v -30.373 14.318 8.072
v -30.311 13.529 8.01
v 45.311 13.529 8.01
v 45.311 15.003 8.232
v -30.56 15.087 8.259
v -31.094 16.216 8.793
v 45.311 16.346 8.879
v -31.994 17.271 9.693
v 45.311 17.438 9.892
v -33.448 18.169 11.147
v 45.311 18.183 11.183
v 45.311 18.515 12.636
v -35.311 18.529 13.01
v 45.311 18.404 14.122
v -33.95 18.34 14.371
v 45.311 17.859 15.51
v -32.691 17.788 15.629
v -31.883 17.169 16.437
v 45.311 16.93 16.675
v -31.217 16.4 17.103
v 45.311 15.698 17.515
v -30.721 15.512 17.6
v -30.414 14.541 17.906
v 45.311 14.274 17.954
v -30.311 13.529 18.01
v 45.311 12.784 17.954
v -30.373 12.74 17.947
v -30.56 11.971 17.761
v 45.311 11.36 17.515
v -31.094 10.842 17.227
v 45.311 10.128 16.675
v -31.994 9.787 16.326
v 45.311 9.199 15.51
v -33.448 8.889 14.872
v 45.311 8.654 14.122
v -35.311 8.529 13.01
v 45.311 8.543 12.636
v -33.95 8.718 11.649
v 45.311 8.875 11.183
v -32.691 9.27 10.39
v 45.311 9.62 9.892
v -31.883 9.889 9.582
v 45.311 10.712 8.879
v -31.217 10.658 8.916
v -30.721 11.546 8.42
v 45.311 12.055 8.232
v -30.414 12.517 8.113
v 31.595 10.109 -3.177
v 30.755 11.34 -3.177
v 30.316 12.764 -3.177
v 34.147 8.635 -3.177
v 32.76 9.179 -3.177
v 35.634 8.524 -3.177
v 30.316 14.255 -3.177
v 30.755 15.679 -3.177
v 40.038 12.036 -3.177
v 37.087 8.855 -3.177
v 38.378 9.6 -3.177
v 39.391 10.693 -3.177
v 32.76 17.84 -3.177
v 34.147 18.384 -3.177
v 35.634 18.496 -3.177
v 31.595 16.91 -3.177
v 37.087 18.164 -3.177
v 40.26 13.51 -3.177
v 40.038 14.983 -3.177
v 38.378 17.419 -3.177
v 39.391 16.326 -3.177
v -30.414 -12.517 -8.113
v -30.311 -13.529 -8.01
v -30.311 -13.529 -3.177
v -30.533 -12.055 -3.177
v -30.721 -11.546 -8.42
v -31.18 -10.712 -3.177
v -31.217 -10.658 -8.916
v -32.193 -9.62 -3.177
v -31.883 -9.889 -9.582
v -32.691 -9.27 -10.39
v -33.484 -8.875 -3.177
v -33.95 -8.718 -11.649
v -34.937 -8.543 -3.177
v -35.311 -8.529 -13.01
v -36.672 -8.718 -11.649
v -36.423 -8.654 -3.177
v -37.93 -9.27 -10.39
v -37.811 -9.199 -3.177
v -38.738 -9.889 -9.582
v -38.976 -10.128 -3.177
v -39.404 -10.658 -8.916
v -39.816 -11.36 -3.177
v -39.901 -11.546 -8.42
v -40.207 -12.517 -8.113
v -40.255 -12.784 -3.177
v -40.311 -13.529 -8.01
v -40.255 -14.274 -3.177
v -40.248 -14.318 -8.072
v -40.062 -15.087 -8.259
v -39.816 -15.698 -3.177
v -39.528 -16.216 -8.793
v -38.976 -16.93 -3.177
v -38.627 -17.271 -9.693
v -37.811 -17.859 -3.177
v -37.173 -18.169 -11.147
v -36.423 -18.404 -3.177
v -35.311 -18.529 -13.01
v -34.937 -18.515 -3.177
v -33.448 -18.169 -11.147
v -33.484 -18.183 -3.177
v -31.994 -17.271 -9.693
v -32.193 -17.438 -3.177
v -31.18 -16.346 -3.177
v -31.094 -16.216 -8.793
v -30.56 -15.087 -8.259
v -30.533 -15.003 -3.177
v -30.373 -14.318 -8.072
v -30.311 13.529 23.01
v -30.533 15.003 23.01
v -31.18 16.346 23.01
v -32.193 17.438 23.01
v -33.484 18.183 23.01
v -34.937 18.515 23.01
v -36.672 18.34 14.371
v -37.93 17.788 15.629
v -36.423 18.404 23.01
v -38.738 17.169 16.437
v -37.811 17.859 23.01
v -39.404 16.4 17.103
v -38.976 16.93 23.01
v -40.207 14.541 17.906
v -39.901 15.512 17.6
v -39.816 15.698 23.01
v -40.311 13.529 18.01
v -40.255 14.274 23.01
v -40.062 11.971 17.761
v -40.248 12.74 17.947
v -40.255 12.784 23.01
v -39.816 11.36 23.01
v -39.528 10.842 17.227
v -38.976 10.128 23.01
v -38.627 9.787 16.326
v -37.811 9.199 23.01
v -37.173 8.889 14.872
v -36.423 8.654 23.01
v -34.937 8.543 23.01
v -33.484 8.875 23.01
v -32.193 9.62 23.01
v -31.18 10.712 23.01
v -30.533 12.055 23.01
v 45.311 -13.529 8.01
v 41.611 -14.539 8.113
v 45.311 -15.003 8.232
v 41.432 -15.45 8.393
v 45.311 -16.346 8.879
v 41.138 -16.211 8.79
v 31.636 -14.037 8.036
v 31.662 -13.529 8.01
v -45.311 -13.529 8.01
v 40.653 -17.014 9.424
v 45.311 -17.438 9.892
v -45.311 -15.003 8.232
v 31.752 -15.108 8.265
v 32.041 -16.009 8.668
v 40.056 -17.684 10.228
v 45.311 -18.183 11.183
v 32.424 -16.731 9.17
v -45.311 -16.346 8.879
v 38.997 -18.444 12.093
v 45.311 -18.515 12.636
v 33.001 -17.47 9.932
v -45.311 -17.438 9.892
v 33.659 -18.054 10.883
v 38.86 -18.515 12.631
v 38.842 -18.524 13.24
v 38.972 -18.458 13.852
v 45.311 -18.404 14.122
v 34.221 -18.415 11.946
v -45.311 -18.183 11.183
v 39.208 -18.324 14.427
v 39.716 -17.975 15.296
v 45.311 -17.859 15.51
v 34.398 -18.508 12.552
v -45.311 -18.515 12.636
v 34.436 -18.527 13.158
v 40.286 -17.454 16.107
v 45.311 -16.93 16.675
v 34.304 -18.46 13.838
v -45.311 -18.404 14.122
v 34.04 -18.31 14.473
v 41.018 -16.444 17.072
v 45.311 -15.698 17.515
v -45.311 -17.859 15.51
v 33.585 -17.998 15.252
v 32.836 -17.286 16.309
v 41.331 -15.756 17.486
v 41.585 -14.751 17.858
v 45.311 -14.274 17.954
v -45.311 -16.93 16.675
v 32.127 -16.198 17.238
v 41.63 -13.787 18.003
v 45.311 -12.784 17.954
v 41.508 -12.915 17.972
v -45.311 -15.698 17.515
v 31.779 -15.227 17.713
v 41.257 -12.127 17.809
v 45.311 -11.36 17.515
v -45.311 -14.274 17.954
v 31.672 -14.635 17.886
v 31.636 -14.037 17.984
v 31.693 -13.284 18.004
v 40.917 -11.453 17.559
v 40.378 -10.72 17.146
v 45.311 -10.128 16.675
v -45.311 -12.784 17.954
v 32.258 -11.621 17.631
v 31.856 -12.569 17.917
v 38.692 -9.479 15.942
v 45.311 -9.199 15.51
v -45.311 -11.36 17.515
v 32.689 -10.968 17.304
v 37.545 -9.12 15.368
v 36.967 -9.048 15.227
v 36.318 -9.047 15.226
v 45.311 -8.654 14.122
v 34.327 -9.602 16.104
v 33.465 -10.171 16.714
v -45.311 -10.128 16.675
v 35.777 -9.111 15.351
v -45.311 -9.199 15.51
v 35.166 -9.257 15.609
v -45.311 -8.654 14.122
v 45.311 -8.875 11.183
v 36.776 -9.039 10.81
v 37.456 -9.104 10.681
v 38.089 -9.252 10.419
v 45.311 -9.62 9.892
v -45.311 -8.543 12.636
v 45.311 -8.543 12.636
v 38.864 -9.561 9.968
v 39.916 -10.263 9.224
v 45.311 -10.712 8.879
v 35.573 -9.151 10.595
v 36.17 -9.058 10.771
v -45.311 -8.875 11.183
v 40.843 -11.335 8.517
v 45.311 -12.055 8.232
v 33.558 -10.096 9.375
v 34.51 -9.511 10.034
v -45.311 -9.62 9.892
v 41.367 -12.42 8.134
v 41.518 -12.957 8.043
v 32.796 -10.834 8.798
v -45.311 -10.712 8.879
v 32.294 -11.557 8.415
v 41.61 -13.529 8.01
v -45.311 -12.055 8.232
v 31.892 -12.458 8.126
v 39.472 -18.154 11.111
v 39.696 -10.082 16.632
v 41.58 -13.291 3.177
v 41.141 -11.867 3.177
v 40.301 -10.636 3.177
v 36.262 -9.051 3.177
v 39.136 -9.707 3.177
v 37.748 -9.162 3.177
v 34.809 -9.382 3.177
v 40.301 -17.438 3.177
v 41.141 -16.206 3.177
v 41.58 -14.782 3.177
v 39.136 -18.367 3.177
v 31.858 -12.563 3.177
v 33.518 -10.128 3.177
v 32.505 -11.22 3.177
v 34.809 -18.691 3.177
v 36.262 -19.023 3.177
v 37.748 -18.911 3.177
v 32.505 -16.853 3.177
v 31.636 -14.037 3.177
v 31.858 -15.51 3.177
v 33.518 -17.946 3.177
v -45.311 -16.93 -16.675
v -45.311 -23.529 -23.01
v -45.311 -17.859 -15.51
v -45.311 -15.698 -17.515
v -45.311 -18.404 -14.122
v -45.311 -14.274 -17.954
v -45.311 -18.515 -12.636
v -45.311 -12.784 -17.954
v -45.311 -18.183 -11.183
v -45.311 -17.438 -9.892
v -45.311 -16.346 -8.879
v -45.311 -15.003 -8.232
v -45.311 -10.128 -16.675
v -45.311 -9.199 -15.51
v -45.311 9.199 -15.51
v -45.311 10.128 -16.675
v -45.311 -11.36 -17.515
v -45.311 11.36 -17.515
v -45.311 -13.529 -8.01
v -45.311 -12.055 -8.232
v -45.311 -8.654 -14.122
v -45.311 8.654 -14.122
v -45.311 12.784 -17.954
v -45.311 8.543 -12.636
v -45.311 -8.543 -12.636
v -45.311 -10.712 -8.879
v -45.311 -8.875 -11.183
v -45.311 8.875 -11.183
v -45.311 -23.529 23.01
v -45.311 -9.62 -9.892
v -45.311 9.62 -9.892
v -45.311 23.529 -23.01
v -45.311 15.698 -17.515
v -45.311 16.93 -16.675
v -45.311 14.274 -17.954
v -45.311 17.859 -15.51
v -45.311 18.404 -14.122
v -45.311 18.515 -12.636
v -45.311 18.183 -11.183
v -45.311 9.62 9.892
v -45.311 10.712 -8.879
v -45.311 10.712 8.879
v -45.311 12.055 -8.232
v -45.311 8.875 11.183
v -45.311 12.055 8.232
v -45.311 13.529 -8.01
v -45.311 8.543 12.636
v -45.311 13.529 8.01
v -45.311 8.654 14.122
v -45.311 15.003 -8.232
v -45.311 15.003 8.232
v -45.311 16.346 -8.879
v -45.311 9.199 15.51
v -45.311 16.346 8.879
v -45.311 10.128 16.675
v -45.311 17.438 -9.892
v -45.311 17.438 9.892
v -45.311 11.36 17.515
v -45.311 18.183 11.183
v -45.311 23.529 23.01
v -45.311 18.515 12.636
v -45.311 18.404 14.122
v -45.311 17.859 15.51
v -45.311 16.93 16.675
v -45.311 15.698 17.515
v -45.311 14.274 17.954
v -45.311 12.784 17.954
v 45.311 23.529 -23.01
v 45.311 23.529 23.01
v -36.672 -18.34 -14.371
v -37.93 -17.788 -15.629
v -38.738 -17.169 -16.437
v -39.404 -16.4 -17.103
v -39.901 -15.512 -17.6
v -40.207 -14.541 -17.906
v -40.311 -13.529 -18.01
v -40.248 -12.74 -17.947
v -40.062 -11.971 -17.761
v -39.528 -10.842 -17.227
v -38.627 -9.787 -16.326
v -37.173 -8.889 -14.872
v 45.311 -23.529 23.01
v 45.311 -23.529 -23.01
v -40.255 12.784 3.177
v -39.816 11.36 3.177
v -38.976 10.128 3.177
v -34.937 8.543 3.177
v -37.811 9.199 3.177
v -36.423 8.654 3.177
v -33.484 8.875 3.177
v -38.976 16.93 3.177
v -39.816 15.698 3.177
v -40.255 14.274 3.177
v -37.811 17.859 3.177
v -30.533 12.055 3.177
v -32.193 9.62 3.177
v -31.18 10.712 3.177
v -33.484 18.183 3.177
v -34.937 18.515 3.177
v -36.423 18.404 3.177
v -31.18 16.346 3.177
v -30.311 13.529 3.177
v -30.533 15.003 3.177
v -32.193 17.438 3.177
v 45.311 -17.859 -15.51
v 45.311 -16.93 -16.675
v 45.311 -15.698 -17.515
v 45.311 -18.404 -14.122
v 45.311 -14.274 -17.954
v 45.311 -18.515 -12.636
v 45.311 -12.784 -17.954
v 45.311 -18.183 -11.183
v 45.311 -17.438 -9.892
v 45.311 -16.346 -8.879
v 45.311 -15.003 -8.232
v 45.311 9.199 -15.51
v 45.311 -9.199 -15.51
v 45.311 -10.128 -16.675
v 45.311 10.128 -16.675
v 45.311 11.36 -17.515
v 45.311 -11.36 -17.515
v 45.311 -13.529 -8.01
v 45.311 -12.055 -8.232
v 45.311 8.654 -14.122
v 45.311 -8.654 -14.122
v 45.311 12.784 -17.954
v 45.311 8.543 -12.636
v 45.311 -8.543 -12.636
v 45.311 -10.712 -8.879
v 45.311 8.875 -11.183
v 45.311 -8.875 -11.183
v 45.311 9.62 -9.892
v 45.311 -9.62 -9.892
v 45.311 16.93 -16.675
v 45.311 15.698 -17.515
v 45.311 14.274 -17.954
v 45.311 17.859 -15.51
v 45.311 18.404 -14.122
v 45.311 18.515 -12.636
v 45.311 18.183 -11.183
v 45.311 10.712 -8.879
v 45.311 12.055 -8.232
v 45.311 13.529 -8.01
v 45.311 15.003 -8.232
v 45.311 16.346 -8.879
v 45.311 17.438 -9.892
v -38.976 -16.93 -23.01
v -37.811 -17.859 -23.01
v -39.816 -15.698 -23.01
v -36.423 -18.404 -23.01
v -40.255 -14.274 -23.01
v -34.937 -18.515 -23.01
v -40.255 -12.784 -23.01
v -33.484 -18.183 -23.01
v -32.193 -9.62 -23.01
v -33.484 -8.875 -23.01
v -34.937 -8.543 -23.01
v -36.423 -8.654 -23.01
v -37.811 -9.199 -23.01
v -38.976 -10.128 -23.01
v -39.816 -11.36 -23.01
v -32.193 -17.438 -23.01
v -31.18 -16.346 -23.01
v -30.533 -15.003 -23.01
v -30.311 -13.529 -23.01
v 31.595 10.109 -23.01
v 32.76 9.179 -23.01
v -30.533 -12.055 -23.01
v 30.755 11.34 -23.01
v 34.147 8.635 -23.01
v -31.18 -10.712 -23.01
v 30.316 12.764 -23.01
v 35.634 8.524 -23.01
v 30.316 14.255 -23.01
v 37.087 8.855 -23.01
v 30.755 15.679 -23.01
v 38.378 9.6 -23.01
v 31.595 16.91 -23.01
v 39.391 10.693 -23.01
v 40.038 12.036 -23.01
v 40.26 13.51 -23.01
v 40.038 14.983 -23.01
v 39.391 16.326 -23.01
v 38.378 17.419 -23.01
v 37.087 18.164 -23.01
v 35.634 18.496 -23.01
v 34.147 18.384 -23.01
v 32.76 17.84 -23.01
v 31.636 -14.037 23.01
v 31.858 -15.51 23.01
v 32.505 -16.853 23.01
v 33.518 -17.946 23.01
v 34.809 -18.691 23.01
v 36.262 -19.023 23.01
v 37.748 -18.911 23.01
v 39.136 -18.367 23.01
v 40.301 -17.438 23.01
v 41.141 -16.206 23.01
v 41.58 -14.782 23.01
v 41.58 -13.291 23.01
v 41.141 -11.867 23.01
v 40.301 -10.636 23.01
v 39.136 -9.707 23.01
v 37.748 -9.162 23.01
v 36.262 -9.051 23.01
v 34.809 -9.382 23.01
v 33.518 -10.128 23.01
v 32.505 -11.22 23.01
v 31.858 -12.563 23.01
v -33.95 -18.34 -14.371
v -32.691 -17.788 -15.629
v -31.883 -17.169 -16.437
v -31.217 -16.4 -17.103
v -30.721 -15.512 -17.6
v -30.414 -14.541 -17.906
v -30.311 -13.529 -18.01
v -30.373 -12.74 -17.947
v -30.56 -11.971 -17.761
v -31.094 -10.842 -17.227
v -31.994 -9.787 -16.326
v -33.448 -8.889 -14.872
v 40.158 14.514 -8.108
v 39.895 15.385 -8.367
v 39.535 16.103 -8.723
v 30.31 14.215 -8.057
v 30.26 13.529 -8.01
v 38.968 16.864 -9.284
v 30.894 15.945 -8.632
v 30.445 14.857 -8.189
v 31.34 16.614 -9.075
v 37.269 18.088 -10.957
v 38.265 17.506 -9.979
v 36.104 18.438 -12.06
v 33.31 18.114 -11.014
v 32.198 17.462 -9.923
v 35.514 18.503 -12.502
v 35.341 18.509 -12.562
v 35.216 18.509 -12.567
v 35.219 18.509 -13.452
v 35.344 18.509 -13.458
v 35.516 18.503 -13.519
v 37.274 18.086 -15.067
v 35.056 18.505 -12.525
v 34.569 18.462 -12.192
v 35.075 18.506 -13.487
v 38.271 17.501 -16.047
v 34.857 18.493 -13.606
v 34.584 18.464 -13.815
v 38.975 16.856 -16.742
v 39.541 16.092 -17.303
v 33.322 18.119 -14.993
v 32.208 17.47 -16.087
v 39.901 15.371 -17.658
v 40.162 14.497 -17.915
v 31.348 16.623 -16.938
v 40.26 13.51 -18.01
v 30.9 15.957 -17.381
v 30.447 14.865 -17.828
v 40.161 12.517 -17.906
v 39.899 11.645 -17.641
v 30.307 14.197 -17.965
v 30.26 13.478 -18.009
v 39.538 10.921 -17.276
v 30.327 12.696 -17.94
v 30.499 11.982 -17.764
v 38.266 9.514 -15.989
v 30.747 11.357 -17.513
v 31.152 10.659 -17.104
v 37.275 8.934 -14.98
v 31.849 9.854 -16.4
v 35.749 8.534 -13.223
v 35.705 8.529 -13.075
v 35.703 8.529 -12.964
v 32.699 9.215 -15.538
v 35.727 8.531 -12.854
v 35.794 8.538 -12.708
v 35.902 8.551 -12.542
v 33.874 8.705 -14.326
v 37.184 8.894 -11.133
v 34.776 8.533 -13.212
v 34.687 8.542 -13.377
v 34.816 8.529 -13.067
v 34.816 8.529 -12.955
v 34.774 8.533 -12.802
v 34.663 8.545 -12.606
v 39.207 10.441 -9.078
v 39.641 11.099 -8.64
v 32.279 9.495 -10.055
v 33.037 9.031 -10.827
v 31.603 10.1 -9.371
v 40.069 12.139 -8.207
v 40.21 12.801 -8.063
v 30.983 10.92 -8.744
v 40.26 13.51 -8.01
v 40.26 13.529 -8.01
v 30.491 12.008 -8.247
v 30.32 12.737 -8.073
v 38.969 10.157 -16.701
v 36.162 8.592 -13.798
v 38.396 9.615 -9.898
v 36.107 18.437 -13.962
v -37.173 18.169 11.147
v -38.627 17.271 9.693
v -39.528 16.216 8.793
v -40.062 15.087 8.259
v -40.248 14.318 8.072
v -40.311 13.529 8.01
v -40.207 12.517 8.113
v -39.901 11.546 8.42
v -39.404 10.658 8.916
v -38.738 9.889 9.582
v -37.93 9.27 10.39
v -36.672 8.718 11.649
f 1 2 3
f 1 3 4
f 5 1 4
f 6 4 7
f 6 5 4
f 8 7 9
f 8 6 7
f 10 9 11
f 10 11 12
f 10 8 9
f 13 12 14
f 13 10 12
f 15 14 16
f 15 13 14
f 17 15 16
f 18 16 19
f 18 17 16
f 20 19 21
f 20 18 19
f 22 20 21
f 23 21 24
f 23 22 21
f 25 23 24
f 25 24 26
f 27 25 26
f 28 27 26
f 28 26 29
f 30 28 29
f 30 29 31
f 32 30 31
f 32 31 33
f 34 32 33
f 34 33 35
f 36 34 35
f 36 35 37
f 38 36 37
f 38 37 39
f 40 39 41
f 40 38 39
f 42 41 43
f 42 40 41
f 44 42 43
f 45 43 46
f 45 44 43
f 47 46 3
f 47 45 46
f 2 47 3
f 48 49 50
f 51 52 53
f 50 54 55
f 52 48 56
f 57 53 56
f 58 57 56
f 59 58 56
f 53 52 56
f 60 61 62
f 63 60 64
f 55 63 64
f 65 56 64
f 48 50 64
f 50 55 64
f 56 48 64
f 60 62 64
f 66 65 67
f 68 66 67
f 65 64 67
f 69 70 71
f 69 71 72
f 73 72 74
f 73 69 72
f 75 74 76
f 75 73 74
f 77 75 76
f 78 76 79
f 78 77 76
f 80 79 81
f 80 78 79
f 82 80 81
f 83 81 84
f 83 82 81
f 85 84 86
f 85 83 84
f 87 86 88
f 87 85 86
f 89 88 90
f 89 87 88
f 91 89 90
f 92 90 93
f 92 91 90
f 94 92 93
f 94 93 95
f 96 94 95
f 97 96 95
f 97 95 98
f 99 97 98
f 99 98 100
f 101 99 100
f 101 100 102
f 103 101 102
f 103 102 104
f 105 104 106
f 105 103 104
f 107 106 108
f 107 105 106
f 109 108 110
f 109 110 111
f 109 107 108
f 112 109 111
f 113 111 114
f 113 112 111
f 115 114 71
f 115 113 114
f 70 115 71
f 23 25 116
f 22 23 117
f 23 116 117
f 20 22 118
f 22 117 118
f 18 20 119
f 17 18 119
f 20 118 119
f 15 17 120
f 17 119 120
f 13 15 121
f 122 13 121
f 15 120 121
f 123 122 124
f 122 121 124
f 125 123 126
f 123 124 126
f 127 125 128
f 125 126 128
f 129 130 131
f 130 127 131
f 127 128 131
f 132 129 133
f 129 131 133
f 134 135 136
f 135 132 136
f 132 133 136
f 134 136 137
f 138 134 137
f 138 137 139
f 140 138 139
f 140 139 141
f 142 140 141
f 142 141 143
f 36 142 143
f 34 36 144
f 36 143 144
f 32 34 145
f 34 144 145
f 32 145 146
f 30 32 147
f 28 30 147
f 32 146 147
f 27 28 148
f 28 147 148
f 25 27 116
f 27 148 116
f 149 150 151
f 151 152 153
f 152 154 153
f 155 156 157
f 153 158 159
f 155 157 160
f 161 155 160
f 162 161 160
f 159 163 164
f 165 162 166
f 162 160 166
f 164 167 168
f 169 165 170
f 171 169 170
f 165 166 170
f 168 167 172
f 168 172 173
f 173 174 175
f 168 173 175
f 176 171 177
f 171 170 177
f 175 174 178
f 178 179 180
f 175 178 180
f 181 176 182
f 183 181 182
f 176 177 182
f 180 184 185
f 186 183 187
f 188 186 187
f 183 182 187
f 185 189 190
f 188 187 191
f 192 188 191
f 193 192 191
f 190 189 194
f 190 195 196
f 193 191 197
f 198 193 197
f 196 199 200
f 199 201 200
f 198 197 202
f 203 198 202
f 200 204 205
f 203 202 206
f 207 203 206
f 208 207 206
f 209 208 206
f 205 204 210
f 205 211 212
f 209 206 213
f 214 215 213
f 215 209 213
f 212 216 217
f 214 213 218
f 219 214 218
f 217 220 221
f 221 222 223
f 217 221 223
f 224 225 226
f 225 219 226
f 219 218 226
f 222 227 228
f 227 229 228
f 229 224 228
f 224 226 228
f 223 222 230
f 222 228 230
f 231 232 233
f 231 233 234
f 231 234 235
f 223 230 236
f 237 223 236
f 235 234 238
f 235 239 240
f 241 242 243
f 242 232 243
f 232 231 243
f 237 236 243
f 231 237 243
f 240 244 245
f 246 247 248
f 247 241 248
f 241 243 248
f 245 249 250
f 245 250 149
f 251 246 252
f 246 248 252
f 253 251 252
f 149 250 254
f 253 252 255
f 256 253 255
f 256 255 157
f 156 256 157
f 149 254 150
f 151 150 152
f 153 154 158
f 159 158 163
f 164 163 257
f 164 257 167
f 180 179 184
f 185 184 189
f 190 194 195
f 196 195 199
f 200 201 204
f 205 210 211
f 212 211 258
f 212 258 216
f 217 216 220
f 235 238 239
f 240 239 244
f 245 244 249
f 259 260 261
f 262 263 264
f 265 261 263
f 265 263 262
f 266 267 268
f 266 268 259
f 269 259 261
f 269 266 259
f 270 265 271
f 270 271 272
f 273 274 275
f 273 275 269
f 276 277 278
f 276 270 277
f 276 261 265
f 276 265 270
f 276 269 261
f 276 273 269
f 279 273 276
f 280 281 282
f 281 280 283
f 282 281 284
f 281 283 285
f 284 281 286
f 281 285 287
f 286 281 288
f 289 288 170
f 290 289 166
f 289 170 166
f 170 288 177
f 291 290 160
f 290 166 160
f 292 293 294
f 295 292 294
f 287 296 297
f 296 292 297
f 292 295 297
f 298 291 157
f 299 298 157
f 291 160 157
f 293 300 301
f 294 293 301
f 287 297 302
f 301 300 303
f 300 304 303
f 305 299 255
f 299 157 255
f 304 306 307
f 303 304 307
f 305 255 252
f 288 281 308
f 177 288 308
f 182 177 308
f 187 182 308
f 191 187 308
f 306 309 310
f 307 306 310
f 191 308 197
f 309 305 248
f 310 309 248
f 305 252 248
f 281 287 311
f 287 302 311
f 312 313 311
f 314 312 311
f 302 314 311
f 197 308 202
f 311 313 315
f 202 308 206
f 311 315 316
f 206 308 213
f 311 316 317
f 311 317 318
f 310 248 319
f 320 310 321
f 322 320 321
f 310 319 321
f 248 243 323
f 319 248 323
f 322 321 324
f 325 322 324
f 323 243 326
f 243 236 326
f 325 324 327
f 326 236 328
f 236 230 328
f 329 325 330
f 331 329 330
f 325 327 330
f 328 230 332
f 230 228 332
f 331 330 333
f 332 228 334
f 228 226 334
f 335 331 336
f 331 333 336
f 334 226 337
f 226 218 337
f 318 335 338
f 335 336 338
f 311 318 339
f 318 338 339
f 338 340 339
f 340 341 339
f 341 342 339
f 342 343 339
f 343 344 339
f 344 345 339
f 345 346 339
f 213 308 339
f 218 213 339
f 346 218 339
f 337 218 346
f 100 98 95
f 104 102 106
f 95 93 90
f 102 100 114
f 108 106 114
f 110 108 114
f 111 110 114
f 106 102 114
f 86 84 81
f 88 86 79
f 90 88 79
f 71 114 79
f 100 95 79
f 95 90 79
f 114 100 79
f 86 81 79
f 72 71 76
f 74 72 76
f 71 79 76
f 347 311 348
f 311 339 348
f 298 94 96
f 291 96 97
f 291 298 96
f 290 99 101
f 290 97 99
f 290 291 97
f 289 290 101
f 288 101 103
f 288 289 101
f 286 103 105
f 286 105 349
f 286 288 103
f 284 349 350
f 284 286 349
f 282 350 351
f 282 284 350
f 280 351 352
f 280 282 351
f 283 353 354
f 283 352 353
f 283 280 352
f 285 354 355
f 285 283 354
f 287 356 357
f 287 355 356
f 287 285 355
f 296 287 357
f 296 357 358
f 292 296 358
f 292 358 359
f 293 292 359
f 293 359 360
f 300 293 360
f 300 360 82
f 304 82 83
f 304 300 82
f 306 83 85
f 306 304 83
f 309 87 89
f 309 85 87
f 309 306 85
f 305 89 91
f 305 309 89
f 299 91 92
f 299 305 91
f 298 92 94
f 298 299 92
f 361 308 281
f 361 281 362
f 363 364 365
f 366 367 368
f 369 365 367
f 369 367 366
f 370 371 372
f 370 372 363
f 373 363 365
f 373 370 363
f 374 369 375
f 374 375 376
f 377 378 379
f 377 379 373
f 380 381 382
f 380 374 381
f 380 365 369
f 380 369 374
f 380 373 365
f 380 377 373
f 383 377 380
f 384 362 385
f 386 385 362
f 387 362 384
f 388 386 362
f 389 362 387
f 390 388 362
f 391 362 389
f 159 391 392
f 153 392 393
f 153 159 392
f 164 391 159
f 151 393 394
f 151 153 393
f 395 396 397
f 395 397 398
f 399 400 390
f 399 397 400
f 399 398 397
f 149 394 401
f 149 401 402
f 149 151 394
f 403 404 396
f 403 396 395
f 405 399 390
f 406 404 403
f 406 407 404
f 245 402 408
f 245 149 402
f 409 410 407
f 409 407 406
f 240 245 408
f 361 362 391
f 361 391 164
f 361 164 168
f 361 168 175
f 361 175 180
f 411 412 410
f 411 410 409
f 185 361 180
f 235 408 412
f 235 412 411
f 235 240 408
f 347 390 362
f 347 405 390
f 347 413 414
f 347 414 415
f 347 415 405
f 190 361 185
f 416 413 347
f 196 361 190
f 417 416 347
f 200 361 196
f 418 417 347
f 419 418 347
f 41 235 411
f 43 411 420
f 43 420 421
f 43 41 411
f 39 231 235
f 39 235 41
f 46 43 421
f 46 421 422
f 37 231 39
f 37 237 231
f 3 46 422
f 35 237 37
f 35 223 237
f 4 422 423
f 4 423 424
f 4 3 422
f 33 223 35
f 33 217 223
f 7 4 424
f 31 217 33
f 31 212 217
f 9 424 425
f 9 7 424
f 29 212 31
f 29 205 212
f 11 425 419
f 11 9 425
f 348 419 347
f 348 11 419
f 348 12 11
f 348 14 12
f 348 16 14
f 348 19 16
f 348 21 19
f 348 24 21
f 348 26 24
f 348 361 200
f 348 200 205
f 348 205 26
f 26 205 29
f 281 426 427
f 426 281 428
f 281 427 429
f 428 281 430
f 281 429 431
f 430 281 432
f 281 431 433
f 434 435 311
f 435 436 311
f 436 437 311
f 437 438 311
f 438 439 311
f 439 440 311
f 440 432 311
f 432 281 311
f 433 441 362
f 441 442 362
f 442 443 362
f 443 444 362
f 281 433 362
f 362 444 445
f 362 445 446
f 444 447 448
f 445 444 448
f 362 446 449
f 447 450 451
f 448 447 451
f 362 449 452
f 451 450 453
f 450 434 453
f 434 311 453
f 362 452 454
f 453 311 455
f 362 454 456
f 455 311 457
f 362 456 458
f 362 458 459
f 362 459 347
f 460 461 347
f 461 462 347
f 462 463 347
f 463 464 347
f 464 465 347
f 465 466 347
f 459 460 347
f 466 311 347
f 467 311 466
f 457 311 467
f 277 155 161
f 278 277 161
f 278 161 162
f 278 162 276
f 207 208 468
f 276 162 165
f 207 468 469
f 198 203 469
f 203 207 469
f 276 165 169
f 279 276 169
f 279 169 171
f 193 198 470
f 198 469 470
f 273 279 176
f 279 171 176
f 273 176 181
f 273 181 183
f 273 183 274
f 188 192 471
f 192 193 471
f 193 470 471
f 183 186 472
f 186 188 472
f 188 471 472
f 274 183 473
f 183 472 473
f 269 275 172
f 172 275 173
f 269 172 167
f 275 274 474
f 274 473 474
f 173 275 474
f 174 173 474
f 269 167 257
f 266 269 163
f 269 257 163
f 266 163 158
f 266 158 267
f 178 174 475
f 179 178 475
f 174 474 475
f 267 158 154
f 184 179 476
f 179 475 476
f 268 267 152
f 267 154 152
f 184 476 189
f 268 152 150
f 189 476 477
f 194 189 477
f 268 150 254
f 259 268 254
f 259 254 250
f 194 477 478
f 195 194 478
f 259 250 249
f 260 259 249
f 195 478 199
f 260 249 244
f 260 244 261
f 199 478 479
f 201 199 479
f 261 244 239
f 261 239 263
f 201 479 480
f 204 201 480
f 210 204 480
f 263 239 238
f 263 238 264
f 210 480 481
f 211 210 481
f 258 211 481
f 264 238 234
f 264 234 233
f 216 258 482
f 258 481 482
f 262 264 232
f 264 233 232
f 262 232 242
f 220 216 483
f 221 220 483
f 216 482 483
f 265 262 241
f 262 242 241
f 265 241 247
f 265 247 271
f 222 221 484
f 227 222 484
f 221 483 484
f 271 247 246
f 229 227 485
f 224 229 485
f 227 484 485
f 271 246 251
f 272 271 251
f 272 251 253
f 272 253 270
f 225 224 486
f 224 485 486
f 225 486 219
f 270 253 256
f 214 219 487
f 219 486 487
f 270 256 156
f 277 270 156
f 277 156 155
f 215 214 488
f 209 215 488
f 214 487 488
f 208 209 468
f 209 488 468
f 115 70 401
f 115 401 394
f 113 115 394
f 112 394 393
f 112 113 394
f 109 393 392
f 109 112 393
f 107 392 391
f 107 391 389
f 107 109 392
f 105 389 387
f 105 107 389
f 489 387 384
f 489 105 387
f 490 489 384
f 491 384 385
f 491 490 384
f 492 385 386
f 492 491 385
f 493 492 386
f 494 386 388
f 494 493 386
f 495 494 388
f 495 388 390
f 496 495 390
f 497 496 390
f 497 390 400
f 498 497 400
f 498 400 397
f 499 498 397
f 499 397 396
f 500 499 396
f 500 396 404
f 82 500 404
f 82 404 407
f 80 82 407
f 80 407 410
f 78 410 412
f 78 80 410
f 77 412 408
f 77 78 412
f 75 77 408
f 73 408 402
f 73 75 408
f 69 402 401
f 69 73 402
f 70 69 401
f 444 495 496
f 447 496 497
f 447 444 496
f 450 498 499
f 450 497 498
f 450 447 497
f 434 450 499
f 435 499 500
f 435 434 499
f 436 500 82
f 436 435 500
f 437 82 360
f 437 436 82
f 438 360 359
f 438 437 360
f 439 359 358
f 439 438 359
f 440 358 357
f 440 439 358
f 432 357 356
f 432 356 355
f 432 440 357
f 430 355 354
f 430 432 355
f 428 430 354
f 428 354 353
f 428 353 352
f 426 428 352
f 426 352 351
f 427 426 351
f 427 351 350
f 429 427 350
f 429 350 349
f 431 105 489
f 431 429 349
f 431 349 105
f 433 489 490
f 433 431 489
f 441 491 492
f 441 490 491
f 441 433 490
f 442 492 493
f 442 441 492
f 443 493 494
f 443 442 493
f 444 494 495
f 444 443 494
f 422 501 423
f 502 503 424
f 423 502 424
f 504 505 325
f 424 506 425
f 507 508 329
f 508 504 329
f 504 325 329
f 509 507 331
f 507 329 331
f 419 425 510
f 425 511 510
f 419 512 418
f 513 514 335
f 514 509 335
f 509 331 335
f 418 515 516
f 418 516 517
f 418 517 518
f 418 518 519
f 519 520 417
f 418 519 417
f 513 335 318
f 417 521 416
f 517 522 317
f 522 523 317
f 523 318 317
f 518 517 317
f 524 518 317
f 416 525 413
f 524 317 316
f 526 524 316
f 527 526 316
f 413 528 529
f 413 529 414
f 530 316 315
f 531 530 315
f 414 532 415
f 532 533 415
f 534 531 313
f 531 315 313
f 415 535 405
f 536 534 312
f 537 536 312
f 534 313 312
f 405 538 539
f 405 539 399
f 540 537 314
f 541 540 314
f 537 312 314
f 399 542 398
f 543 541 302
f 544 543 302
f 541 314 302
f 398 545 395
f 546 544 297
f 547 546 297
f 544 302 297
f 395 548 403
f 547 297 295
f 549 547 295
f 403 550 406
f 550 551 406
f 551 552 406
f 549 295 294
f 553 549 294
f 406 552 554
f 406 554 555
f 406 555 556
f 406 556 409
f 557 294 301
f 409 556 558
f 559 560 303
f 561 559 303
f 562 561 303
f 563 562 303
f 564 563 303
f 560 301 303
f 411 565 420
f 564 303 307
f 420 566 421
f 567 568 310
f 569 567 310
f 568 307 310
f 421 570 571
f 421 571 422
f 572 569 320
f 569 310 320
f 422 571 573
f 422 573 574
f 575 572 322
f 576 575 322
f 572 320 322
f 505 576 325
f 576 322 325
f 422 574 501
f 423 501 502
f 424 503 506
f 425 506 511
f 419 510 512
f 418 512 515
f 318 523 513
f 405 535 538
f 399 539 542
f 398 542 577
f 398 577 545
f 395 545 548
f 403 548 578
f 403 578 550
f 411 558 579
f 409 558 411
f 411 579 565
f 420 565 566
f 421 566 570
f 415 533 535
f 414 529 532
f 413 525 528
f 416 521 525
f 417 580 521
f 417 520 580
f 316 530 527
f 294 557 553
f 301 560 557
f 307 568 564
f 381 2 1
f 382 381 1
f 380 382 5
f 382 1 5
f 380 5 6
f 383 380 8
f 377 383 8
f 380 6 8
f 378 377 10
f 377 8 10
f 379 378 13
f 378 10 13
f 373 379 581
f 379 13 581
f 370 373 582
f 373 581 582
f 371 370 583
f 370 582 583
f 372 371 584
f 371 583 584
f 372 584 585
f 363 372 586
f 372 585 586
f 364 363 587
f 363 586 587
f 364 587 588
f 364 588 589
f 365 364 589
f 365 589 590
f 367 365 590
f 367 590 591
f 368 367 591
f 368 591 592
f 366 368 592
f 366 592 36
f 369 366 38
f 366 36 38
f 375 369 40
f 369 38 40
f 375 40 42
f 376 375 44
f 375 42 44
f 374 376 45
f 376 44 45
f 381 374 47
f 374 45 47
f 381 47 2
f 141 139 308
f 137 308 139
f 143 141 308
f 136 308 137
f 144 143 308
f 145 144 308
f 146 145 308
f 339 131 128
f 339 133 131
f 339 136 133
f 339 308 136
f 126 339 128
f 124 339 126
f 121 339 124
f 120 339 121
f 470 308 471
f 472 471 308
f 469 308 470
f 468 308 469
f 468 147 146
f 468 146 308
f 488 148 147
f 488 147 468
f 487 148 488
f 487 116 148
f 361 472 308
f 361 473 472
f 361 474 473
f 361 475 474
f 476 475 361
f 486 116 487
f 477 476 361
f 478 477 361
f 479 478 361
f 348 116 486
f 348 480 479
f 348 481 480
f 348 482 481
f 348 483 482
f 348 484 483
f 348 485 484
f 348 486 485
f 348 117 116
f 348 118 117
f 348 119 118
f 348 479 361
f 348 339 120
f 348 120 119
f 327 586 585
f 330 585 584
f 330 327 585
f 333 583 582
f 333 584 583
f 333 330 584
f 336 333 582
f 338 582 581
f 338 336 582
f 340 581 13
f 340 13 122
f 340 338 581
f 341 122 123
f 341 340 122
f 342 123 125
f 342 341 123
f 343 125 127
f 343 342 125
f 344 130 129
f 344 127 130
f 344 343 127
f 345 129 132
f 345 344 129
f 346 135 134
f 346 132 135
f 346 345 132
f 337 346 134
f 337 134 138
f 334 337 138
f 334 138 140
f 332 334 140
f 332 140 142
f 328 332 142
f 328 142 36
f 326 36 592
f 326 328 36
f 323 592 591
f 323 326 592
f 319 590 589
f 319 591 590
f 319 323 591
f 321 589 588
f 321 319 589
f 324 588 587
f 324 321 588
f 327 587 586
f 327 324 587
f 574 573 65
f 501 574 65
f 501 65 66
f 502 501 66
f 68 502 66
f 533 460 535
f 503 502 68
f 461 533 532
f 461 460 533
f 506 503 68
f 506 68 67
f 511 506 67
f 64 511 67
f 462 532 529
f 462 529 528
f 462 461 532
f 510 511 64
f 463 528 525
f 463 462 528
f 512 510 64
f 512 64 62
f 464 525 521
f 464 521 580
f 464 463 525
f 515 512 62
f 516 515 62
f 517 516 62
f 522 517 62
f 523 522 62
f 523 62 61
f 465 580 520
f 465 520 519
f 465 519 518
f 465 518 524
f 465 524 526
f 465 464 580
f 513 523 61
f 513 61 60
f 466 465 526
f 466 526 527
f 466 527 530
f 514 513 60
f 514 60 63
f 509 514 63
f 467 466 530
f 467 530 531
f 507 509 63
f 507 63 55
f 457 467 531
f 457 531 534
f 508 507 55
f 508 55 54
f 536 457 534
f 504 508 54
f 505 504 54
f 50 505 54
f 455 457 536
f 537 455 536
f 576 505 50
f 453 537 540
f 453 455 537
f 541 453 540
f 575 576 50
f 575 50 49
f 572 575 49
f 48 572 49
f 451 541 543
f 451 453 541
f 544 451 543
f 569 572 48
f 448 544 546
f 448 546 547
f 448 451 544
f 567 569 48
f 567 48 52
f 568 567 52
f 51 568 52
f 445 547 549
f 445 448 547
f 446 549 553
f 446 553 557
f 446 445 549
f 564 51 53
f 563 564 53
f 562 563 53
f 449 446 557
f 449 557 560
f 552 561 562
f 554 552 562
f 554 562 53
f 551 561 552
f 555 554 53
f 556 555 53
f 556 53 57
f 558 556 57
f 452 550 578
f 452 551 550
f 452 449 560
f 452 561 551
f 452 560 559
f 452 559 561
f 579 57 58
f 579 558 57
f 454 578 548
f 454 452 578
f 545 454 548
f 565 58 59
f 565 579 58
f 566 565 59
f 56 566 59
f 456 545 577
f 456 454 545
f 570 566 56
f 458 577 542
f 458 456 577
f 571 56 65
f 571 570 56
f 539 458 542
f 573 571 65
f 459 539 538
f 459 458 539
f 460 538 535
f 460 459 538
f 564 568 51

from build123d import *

# Parameters (mm, degrees)
SKETCH1_W               = 90.621510256
SKETCH1_H               = 47.057987938
BOSS_EXTRUDE1_DEPTH     = 23.009727366
BOSS_EXTRUDE3_START     = -90.621510256
BOSS_EXTRUDE3_OUTLINE_R = 5
BOSS_EXTRUDE3_DEPTH     = 90.621510256
SKETCH11_R              = 5
CUT_EXTRUDE3_DEPTH      = 19.832993722
CIRPATTERN1_COUNT       = 2
CIRPATTERN2_START       = -23.009727366
CIRPATTERN2_OUTLINE_R   = 5
CIRPATTERN2_DEPTH       = 19.832993722


# Read off the part's stored shape, not the designer's step: Boss-Extrude3, CirPattern2
with BuildPart() as part:
    # Sketch1 → Boss-Extrude1 (new body)
    with BuildSketch(Plane.XY):
        Rectangle(SKETCH1_W, SKETCH1_H)
    extrude(amount=BOSS_EXTRUDE1_DEPTH)

    # Boss-Extrude3 outline → Boss-Extrude3 (cut)
    with BuildSketch(Plane(origin=(45.310755128, 0, 0), x_dir=(0, 0, -1), z_dir=(1, 0, 0)).offset(BOSS_EXTRUDE3_START)):
        with Locations((-13.009727366, 13.528993969)):
            Circle(BOSS_EXTRUDE3_OUTLINE_R)
    boss_extrude3 = extrude(amount=BOSS_EXTRUDE3_DEPTH, mode=Mode.SUBTRACT)

    # Mirror4: Boss-Extrude3 across plane
    add(boss_extrude3.mirror(Plane.ZX), mode=Mode.SUBTRACT)

    # Mirror5: part across plane


with BuildPart() as part_1:
    add(part.part)
    add(part.part.mirror(Plane.XY))

    # Sketch11 → Cut-Extrude3 (cut)
    with BuildSketch(Plane.XY.offset(23.009727366)):
        with Locations((-35.310755128, 13.528993969)):
            Circle(SKETCH11_R)
    cut_extrude3 = extrude(amount=-CUT_EXTRUDE3_DEPTH, mode=Mode.SUBTRACT)

    # CirPattern1: Cut-Extrude3 ×2 about axis
    cirpattern1_axis = Axis((0.662529663, -0.253842201, 0), (0, 0, 1))
    for i in range(1, CIRPATTERN1_COUNT):
        add(cut_extrude3.rotate(cirpattern1_axis, i * 360 / CIRPATTERN1_COUNT), mode=Mode.SUBTRACT)

    # CirPattern2 outline → CirPattern2 (cut)
    with BuildSketch(Plane.XY.offset(CIRPATTERN2_START)):
        with Locations((-35.310755128, -13.528993969)):
            Circle(CIRPATTERN2_OUTLINE_R)
        with Locations((35.260080607, 13.509578489)):
            Circle(CIRPATTERN2_OUTLINE_R)
    extrude(amount=CIRPATTERN2_DEPTH, mode=Mode.SUBTRACT)


solid = part_1.part
